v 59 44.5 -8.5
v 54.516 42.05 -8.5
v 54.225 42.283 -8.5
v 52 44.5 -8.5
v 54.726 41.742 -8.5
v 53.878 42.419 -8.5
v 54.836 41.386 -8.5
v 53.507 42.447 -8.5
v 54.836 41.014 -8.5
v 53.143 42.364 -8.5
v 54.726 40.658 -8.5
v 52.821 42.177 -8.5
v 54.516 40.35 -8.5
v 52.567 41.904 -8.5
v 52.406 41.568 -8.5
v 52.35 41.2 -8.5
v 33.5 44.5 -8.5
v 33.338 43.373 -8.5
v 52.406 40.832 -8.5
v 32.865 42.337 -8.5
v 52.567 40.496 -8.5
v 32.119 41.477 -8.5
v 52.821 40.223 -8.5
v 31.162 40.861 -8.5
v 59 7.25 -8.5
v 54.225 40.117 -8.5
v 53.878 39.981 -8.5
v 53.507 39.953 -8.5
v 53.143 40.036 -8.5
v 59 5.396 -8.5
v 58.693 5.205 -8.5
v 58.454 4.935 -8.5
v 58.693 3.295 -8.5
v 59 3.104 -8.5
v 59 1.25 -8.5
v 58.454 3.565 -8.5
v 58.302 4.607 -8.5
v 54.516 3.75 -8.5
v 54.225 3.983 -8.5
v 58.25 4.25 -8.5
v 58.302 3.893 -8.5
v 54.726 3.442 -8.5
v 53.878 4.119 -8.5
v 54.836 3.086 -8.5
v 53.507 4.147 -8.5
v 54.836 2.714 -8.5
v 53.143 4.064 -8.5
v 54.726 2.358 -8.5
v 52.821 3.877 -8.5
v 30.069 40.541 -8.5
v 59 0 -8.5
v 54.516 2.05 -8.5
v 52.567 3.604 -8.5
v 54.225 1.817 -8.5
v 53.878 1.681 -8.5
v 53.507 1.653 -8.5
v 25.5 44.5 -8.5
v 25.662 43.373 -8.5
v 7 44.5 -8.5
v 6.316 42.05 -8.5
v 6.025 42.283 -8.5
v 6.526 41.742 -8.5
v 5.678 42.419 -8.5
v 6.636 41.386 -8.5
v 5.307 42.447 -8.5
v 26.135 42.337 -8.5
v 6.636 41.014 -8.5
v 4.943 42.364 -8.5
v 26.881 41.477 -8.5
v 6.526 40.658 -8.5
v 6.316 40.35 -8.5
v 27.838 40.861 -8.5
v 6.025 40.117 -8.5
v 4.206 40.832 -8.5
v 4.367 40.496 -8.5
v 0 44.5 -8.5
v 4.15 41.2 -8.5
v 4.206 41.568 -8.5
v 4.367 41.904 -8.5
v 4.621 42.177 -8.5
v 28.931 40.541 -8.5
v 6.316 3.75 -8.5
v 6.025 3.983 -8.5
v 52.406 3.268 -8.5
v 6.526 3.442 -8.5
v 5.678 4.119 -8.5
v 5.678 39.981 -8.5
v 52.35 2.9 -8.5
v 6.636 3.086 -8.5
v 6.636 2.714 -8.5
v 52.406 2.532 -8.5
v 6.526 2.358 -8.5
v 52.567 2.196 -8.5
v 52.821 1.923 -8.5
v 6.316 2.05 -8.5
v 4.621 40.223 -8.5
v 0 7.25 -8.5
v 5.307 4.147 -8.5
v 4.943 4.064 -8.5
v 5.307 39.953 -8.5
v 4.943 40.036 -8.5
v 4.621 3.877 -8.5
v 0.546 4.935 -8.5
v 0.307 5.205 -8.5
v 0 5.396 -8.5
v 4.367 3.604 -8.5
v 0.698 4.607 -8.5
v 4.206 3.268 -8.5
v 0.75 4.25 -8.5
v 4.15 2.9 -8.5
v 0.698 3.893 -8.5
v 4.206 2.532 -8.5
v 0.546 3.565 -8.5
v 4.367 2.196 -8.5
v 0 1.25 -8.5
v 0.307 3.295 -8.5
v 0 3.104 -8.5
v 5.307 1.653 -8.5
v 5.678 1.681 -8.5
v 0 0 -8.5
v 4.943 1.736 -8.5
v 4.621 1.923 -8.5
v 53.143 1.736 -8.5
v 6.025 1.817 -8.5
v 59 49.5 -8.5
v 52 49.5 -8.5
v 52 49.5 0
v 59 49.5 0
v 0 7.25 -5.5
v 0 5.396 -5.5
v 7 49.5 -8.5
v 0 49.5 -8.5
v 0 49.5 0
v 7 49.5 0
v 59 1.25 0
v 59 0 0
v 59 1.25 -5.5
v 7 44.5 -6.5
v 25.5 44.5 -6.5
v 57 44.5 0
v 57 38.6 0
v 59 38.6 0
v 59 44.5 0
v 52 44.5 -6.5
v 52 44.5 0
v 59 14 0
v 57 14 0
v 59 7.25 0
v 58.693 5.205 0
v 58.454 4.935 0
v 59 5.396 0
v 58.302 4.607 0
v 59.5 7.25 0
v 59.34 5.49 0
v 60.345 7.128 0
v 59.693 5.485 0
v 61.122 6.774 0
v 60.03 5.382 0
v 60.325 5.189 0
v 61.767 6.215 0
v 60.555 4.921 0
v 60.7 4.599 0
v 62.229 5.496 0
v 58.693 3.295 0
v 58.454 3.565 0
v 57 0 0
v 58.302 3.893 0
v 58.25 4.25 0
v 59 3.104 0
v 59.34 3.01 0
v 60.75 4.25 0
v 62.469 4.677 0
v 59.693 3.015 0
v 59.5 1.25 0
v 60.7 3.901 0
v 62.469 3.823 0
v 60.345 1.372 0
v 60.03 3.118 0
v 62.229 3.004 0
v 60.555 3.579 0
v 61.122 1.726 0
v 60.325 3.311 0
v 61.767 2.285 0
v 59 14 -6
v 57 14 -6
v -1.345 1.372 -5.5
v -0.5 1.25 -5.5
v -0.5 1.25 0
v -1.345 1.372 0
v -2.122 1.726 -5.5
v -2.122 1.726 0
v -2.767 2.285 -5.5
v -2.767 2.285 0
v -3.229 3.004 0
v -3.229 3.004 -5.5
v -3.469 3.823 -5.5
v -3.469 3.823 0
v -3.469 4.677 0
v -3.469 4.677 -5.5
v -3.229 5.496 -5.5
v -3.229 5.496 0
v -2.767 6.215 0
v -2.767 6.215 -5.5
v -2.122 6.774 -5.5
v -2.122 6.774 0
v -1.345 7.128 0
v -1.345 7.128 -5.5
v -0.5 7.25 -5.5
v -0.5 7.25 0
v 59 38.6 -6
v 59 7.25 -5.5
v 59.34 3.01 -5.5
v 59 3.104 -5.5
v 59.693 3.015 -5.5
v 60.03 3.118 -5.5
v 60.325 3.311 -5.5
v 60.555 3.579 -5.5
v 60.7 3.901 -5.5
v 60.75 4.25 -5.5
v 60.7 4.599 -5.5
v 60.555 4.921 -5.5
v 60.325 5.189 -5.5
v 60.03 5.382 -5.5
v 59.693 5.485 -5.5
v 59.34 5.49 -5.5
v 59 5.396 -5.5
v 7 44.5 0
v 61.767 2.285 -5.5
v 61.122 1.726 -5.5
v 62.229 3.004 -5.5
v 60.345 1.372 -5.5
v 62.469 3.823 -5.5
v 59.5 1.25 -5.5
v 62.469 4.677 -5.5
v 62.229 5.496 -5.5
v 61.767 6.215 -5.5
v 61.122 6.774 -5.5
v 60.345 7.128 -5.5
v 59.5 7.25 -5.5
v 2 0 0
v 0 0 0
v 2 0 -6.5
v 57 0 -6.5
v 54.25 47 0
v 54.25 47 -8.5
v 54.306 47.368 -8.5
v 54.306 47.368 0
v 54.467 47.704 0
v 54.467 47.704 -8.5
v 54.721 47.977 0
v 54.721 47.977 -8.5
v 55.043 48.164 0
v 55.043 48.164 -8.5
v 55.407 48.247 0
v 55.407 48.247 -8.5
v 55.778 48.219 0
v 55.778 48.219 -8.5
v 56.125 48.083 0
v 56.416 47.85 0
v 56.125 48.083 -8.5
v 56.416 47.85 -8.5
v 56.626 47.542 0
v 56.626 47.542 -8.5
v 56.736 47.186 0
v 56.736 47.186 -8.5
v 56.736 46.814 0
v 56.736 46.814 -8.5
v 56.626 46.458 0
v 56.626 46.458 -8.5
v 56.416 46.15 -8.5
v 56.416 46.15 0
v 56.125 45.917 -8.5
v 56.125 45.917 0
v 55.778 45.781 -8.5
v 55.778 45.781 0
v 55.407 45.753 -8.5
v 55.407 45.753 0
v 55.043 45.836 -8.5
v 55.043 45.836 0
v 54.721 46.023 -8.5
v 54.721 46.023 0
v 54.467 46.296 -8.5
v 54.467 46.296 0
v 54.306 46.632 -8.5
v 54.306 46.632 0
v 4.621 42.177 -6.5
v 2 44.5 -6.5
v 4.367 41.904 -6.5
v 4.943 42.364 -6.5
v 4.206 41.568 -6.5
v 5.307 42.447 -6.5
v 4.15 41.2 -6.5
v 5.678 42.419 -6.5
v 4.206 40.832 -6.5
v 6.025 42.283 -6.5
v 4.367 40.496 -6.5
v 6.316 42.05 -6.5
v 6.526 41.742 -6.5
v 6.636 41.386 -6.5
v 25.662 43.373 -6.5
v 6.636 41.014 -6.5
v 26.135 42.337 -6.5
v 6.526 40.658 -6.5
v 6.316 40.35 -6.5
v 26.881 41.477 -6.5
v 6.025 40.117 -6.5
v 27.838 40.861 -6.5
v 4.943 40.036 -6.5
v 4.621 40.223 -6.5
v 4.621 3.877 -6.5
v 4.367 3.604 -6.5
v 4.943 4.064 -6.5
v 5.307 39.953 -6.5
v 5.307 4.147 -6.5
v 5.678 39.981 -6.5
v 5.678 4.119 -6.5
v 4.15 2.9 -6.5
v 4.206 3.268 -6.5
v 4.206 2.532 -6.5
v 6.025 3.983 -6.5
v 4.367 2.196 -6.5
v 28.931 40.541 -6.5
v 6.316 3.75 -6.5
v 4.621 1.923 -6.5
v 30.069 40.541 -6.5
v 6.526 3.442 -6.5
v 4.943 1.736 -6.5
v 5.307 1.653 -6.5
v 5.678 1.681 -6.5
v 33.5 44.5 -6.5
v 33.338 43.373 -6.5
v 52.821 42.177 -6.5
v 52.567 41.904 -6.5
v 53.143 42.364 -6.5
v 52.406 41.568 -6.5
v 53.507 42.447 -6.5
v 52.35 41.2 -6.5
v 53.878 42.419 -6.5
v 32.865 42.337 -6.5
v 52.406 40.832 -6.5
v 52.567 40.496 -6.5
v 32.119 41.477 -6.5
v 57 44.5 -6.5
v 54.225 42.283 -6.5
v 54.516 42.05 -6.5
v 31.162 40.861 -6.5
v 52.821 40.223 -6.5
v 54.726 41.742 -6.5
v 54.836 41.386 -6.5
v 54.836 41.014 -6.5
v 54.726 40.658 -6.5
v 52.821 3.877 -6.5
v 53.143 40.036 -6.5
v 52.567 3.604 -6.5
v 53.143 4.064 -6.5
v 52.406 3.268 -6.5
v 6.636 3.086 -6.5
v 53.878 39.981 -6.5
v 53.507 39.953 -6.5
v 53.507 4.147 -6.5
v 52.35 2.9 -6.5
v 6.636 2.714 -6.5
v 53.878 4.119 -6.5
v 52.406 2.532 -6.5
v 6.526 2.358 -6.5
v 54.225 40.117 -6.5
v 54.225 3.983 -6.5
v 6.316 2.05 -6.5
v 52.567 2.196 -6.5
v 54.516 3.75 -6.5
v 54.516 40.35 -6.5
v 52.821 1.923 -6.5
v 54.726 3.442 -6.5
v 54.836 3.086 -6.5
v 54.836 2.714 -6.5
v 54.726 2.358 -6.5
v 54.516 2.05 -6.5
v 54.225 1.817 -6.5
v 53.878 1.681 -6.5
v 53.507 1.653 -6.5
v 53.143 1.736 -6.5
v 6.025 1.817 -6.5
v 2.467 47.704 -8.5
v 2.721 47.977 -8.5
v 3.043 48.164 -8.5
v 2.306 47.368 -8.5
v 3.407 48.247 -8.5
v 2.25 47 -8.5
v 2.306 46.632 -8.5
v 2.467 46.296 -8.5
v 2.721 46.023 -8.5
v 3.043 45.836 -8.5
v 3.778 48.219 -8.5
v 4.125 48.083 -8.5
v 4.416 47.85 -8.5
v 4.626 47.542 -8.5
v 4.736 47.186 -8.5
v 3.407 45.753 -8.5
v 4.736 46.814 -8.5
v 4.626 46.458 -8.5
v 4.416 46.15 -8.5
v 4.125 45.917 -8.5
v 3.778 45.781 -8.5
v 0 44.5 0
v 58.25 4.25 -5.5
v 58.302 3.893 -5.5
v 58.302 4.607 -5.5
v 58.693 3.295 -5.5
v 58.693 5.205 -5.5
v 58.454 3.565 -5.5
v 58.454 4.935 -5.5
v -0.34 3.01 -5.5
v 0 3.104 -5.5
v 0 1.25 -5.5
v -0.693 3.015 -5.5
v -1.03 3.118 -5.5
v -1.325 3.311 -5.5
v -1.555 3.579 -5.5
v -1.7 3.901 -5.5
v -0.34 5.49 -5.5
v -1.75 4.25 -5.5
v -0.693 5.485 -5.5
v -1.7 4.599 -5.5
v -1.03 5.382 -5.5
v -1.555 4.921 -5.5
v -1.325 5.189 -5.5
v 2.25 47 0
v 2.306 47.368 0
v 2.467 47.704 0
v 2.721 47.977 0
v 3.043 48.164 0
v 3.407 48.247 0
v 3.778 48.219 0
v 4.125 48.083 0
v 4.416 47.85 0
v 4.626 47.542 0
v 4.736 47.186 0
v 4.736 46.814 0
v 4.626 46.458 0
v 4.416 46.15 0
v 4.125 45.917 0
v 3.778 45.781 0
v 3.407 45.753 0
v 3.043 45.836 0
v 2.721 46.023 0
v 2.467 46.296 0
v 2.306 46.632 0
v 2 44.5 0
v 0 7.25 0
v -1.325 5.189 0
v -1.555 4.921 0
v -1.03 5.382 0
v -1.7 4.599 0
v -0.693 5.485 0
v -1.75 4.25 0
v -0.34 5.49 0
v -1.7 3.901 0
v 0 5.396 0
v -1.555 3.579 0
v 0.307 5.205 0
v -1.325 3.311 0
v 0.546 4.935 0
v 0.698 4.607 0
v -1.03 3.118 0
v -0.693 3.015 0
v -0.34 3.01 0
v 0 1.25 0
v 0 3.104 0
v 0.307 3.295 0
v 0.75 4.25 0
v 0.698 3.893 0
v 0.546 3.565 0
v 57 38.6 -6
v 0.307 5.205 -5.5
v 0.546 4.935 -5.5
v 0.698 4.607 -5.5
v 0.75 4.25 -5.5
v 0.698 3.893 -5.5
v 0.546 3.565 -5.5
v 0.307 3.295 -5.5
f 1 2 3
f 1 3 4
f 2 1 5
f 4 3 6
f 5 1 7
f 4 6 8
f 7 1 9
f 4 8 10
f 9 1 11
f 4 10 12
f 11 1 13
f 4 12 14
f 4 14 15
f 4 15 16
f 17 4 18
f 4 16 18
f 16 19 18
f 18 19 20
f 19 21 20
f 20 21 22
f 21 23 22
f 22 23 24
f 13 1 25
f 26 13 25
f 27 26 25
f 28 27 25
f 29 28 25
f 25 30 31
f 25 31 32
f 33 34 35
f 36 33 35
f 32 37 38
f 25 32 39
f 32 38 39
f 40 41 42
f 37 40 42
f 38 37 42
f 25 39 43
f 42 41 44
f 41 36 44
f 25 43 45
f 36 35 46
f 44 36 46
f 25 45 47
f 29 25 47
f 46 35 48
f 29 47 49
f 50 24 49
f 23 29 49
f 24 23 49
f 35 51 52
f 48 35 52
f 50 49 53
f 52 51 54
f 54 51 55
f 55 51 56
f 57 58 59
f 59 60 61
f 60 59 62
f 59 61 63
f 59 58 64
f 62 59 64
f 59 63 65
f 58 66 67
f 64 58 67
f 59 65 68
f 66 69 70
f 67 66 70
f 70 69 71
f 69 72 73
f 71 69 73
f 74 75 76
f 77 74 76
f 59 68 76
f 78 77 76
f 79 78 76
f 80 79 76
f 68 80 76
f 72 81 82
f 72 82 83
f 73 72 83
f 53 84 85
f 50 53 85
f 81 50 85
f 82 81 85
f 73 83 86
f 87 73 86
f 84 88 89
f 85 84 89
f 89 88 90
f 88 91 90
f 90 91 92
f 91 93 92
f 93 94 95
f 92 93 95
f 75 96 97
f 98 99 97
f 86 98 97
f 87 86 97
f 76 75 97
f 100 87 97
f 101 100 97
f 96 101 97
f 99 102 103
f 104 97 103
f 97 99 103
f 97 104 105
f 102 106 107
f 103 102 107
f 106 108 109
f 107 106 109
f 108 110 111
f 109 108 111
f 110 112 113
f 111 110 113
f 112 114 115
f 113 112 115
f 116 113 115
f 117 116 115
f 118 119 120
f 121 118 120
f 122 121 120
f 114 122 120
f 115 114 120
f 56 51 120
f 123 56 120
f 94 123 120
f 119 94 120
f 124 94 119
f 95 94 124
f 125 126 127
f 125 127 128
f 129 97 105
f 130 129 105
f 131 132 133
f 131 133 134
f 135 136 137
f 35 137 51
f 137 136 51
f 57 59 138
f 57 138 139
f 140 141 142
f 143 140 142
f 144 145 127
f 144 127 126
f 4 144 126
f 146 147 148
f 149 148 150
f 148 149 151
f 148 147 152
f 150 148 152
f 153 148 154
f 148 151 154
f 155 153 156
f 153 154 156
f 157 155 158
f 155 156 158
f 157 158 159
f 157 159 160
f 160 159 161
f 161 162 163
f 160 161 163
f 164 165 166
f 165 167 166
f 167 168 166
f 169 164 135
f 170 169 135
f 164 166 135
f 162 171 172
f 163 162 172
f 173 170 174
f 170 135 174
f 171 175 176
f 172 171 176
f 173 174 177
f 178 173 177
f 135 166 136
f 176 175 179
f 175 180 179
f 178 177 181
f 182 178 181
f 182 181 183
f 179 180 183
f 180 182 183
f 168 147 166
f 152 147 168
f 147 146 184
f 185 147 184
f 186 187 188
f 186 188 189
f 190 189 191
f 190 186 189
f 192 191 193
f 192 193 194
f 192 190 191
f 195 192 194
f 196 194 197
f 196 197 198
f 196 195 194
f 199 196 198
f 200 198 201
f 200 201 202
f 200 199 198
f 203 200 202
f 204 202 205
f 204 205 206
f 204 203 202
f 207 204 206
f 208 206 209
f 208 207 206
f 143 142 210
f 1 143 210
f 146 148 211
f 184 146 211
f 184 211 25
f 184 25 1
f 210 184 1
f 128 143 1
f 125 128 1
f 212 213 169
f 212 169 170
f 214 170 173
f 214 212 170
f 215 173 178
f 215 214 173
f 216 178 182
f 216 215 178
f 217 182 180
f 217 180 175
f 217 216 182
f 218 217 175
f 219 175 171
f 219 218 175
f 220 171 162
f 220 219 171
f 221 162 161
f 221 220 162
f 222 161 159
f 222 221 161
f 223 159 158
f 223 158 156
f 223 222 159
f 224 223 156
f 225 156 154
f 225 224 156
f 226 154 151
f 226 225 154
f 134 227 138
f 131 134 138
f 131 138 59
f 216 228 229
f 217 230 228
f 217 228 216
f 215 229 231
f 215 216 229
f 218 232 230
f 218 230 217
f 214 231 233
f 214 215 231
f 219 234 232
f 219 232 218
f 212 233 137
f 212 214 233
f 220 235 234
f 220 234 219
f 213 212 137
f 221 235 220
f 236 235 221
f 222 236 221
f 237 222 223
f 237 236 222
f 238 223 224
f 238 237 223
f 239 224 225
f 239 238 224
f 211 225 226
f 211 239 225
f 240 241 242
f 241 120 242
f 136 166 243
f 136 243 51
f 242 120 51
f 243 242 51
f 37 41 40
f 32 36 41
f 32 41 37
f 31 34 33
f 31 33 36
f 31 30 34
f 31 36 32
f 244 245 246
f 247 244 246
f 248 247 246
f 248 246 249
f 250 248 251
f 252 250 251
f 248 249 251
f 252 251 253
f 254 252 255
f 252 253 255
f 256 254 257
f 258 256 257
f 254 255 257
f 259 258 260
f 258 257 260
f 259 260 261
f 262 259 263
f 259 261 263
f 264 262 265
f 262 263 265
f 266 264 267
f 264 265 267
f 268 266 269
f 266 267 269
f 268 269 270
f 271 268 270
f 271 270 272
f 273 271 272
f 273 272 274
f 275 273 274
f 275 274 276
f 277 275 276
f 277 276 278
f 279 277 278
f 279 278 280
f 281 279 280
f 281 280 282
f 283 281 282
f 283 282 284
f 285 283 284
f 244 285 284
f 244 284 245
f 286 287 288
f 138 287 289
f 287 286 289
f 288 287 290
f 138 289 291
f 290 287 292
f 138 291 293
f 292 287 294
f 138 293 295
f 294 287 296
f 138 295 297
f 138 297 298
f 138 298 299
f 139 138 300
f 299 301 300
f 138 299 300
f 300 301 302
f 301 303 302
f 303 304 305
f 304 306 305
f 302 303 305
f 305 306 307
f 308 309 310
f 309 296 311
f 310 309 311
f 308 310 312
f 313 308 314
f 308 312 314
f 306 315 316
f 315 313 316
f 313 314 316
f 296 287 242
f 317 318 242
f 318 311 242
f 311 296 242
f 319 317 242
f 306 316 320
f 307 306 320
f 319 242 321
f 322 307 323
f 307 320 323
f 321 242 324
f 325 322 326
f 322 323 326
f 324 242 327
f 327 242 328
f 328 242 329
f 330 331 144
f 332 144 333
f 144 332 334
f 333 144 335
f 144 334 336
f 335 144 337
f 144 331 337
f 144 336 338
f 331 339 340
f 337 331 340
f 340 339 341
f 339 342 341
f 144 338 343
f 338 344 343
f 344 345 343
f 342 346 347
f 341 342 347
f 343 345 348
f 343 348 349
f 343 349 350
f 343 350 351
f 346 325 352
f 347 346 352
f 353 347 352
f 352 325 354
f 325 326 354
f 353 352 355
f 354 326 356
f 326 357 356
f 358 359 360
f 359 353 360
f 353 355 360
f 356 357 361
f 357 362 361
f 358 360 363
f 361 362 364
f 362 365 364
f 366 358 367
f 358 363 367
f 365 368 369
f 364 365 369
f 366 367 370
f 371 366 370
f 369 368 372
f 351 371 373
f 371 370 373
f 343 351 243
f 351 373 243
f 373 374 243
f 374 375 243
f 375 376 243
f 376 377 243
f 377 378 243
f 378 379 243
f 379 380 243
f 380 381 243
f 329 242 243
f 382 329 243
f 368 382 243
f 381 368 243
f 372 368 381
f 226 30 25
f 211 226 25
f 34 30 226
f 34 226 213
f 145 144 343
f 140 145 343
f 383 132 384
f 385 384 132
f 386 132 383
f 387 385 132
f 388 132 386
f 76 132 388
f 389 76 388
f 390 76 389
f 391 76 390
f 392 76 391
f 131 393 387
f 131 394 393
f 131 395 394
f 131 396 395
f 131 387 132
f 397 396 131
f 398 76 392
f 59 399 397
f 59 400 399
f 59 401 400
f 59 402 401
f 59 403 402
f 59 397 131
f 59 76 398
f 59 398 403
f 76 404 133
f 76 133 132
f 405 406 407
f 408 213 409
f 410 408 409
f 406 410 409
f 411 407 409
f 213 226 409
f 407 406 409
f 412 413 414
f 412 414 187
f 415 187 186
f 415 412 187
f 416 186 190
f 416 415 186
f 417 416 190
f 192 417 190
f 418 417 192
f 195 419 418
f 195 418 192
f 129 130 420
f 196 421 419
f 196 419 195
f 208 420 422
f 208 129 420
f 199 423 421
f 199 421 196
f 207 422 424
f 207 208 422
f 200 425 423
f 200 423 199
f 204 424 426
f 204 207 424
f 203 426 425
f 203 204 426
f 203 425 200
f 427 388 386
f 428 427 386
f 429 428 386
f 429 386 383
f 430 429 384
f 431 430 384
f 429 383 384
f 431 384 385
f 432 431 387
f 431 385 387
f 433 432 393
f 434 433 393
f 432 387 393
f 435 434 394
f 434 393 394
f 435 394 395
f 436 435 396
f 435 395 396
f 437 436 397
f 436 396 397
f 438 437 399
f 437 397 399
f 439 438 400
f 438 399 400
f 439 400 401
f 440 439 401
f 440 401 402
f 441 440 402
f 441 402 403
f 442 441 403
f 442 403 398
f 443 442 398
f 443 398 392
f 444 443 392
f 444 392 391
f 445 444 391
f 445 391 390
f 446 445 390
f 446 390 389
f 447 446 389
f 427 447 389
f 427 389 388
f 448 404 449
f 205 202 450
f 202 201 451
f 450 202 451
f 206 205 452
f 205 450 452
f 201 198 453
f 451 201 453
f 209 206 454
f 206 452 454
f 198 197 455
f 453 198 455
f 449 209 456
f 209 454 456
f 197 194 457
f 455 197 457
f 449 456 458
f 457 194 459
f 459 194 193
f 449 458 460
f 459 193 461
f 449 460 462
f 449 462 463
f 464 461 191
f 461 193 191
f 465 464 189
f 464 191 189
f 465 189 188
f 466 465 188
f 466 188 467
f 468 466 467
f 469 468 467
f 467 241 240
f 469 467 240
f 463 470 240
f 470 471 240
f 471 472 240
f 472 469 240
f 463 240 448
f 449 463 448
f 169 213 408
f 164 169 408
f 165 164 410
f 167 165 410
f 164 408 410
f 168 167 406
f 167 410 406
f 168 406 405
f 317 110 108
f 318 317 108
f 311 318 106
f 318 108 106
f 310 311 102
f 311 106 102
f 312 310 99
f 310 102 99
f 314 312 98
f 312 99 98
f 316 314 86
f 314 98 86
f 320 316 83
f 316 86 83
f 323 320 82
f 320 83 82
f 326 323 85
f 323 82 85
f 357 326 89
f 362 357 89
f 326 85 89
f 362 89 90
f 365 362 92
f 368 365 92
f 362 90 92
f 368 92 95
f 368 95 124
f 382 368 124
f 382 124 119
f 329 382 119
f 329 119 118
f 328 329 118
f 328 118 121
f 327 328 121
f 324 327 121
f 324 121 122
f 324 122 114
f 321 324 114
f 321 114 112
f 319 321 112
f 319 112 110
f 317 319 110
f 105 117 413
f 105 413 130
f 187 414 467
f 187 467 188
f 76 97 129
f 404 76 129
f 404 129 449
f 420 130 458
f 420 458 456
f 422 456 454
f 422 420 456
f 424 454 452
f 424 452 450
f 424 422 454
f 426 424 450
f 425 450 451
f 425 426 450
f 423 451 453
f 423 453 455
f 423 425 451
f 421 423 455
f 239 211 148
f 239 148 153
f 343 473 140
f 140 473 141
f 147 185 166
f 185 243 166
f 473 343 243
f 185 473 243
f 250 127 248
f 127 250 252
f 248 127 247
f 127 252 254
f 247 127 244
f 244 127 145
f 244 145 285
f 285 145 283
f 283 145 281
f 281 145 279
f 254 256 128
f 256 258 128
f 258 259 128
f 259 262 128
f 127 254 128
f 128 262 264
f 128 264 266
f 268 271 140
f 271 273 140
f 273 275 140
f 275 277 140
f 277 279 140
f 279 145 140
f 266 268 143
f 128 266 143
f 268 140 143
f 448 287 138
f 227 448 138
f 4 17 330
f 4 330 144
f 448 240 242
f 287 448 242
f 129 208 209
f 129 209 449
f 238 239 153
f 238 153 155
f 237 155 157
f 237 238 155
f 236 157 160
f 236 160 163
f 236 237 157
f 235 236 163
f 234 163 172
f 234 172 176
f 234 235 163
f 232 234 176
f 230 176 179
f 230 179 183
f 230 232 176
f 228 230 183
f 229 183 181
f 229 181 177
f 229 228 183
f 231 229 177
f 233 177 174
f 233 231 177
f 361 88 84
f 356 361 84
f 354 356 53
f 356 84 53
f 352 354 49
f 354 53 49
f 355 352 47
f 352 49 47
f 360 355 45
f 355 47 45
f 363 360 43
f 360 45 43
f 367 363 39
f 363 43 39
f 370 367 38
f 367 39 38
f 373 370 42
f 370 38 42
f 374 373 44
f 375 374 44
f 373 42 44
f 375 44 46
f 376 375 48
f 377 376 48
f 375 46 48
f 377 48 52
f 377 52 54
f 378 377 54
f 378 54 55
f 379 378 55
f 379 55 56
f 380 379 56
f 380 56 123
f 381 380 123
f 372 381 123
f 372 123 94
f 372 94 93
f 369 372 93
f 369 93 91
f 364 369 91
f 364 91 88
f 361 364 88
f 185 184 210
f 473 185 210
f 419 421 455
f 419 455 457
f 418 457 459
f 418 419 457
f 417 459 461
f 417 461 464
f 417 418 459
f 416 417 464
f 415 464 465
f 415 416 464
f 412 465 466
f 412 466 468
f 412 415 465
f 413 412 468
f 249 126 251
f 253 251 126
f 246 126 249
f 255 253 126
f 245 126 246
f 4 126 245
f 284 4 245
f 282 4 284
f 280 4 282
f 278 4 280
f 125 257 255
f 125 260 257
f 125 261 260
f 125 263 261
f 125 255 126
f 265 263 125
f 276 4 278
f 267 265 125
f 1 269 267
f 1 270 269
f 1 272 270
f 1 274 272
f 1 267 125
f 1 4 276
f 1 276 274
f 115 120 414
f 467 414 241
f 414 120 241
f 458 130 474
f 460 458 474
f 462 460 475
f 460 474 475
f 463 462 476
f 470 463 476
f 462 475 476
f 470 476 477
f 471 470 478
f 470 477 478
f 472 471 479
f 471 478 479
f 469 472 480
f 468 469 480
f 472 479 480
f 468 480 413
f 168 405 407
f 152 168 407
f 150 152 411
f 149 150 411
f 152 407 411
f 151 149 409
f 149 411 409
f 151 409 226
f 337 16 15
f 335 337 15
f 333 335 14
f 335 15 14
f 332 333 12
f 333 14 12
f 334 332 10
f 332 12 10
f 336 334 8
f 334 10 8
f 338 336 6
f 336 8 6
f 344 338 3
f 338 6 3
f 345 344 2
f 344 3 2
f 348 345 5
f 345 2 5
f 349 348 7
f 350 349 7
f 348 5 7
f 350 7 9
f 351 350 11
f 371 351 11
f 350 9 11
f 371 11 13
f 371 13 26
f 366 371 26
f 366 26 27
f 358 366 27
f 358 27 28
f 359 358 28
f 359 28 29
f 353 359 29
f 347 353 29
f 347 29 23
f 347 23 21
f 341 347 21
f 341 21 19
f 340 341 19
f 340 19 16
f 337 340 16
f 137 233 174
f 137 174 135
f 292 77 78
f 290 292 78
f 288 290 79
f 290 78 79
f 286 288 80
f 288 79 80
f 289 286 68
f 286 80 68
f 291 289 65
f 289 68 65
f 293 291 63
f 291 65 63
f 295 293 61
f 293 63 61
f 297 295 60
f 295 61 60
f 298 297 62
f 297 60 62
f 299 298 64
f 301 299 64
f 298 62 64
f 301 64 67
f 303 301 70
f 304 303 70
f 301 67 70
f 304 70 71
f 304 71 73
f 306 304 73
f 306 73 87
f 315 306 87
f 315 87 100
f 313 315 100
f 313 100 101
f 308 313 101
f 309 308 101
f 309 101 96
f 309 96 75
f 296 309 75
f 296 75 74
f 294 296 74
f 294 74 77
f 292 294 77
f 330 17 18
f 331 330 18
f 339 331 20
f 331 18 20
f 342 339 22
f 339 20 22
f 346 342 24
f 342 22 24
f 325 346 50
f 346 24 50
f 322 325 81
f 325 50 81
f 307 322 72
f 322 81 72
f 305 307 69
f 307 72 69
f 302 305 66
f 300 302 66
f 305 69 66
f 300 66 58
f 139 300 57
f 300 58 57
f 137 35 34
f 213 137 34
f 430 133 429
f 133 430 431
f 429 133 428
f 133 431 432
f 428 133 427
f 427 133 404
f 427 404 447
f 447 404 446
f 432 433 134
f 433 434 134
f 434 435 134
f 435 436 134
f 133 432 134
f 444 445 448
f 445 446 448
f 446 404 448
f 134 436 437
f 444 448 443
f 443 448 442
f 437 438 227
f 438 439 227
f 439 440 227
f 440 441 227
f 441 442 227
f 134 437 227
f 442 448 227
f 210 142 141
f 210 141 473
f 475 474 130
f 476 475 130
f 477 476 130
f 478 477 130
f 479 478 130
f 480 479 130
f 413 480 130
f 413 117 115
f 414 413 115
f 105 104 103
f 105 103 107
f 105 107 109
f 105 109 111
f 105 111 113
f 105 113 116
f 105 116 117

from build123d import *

# Parameters (mm, degrees)
BOSS_EXTRUDE1_DEPTH = 44.5
SKETCH2_W           = 6
SKETCH2_H           = 24.6
CUT_EXTRUDE1_DEPTH  = 10
BOSS_EXTRUDE2_DEPTH = 8.5
CUT_EXTRUDE2_DEPTH  = 11
SKETCH4_W           = 7
SKETCH4_H           = 8.5
BOSS_EXTRUDE3_DEPTH = 5
SKETCH5_R           = 1.25
CUT_EXTRUDE3_DEPTH  = 81.179486155
SKETCH7_R           = 1.25
CUT_EXTRUDE4_DEPTH  = 10
SKETCH8_R           = 4
CUT_EXTRUDE5_DEPTH  = 81.179486155
CUT_EXTRUDE6_DEPTH  = 3
BOSS_EXTRUDE4_DEPTH = 3


with BuildPart() as part:
    # Sketch1 → Boss-Extrude1 (new body)
    with BuildSketch(Plane(origin=(0, 0, 0), x_dir=(1, 0, 0), z_dir=(0, 1, 0))):
        Polygon((0, 0), (2, 0), (2, 6.5), (57, 6.5), (57, 0), (59, 0), (59, 8.5), (0, 8.5), align=None)
    extrude(amount=BOSS_EXTRUDE1_DEPTH)

    # Sketch2 → Cut-Extrude1 (cut)
    with BuildSketch(Plane(origin=(59, 0, 0), x_dir=(0, 0, -1), z_dir=(1, 0, 0))):
        with Locations((3, 26.3)):
            Rectangle(SKETCH2_W, SKETCH2_H)
    extrude(amount=-CUT_EXTRUDE1_DEPTH, mode=Mode.SUBTRACT)

    # Sketch3 → Boss-Extrude2 (add)
    with BuildSketch(Plane(origin=(0, 0, -8.5), x_dir=(-1, 0, 0), z_dir=(0, 0, -1))):
        with BuildLine():
            Line((-59, 5.395643924), (-59, 7.25))
            Line((-59, 7.25), (-59.5, 7.25))
            ThreePointArc((-59.5, 7.25), (-62.5, 4.25), (-59.5, 1.25))
            Line((-59.5, 1.25), (-59, 1.25))
            Line((-59, 1.25), (-59, 3.104356076))
            ThreePointArc((-59, 3.104356076), (-60.75, 4.25), (-59, 5.395643924))
        make_face()
        with BuildLine():
            Line((0.5, 7.25), (0, 7.25))
            Line((0, 7.25), (0, 5.395643924))
            ThreePointArc((0, 5.395643924), (1.75, 4.25), (0, 3.104356076))
            Line((0, 3.104356076), (0, 1.25))
            Line((0, 1.25), (0.5, 1.25))
            ThreePointArc((0.5, 1.25), (3.5, 4.25), (0.5, 7.25))
        make_face()
    extrude(amount=-BOSS_EXTRUDE2_DEPTH)

    # Sketch3<3> → Cut-Extrude2 (cut)
    with BuildSketch(Plane(origin=(0, 0, -8.5), x_dir=(-1, 0, 0), z_dir=(0, 0, -1))):
        with BuildLine():
            ThreePointArc((-59, 3.104356076), (-58.25, 4.25), (-59, 5.395643924))
            Line((-59, 5.395643924), (-59, 3.104356076))
        make_face()
        with BuildLine():
            Line((0, 3.104356076), (0, 5.395643924))
            ThreePointArc((0, 5.395643924), (-0.75, 4.25), (0, 3.104356076))
        make_face()
    extrude(amount=-CUT_EXTRUDE2_DEPTH, mode=Mode.SUBTRACT)

    # Sketch4 → Boss-Extrude3 (add)
    with BuildSketch(Plane(origin=(0, 44.5, 0), x_dir=(1, 0, 0), z_dir=(0, 1, 0))):
        with Locations((3.5, 4.25)):
            Rectangle(SKETCH4_W, SKETCH4_H)
        with Locations((55.5, 4.25)):
            Rectangle(SKETCH4_W, SKETCH4_H)
    extrude(amount=BOSS_EXTRUDE3_DEPTH)

    # Sketch5 → Cut-Extrude3 (cut, through all)
    with BuildSketch(Plane(origin=(0, 0, -8.5), x_dir=(-1, 0, 0), z_dir=(0, 0, -1))):
        with Locations((-55.5, 47)):
            Circle(SKETCH5_R)
        with Locations((-3.5, 47)):
            Circle(SKETCH5_R)
    extrude(amount=-CUT_EXTRUDE3_DEPTH, mode=Mode.SUBTRACT)

    # Sketch7 → Cut-Extrude4 (cut)
    with BuildSketch(Plane(origin=(0, 0, -8.5), x_dir=(-1, 0, 0), z_dir=(0, 0, -1))):
        with Locations((-5.4, 2.9)):
            Circle(SKETCH7_R)
        with Locations((-53.6, 2.9)):
            Circle(SKETCH7_R)
        with Locations((-53.6, 41.2)):
            Circle(SKETCH7_R)
        with Locations((-5.4, 41.2)):
            Circle(SKETCH7_R)
    extrude(amount=-CUT_EXTRUDE4_DEPTH, mode=Mode.SUBTRACT)

    # Sketch8 → Cut-Extrude5 (cut, through all)
    with BuildSketch(Plane(origin=(0, 0, -8.5), x_dir=(-1, 0, 0), z_dir=(0, 0, -1))):
        with Locations((-29.5, 44.5)):
            Circle(SKETCH8_R)
    extrude(amount=-CUT_EXTRUDE5_DEPTH, mode=Mode.SUBTRACT)

    # Sketch3<4> → Cut-Extrude6 (cut)
    with BuildSketch(Plane(origin=(0, 0, -8.5), x_dir=(-1, 0, 0), z_dir=(0, 0, -1))):
        with BuildLine():
            Line((-59, 5.395643924), (-59, 7.25))
            Line((-59, 7.25), (-59.5, 7.25))
            ThreePointArc((-59.5, 7.25), (-62.5, 4.25), (-59.5, 1.25))
            Line((-59.5, 1.25), (-59, 1.25))
            Line((-59, 1.25), (-59, 3.104356076))
            ThreePointArc((-59, 3.104356076), (-60.75, 4.25), (-59, 5.395643924))
        make_face()
        with BuildLine():
            Line((0.5, 7.25), (0, 7.25))
            Line((0, 7.25), (0, 5.395643924))
            ThreePointArc((0, 5.395643924), (1.75, 4.25), (0, 3.104356076))
            Line((0, 3.104356076), (0, 1.25))
            Line((0, 1.25), (0.5, 1.25))
            ThreePointArc((0.5, 1.25), (3.5, 4.25), (0.5, 7.25))
        make_face()
    extrude(amount=-CUT_EXTRUDE6_DEPTH, mode=Mode.SUBTRACT)

    # Sketch3<5> → Boss-Extrude4 (add)
    with BuildSketch(Plane(origin=(0, 0, -8.5), x_dir=(-1, 0, 0), z_dir=(0, 0, -1))):
        with BuildLine():
            ThreePointArc((-59, 3.104356076), (-58.25, 4.25), (-59, 5.395643924))
            Line((-59, 5.395643924), (-59, 3.104356076))
        make_face()
        with BuildLine():
            Line((0, 3.104356076), (0, 5.395643924))
            ThreePointArc((0, 5.395643924), (-0.75, 4.25), (0, 3.104356076))
        make_face()
    extrude(amount=-BOSS_EXTRUDE4_DEPTH)


solid = part.part
